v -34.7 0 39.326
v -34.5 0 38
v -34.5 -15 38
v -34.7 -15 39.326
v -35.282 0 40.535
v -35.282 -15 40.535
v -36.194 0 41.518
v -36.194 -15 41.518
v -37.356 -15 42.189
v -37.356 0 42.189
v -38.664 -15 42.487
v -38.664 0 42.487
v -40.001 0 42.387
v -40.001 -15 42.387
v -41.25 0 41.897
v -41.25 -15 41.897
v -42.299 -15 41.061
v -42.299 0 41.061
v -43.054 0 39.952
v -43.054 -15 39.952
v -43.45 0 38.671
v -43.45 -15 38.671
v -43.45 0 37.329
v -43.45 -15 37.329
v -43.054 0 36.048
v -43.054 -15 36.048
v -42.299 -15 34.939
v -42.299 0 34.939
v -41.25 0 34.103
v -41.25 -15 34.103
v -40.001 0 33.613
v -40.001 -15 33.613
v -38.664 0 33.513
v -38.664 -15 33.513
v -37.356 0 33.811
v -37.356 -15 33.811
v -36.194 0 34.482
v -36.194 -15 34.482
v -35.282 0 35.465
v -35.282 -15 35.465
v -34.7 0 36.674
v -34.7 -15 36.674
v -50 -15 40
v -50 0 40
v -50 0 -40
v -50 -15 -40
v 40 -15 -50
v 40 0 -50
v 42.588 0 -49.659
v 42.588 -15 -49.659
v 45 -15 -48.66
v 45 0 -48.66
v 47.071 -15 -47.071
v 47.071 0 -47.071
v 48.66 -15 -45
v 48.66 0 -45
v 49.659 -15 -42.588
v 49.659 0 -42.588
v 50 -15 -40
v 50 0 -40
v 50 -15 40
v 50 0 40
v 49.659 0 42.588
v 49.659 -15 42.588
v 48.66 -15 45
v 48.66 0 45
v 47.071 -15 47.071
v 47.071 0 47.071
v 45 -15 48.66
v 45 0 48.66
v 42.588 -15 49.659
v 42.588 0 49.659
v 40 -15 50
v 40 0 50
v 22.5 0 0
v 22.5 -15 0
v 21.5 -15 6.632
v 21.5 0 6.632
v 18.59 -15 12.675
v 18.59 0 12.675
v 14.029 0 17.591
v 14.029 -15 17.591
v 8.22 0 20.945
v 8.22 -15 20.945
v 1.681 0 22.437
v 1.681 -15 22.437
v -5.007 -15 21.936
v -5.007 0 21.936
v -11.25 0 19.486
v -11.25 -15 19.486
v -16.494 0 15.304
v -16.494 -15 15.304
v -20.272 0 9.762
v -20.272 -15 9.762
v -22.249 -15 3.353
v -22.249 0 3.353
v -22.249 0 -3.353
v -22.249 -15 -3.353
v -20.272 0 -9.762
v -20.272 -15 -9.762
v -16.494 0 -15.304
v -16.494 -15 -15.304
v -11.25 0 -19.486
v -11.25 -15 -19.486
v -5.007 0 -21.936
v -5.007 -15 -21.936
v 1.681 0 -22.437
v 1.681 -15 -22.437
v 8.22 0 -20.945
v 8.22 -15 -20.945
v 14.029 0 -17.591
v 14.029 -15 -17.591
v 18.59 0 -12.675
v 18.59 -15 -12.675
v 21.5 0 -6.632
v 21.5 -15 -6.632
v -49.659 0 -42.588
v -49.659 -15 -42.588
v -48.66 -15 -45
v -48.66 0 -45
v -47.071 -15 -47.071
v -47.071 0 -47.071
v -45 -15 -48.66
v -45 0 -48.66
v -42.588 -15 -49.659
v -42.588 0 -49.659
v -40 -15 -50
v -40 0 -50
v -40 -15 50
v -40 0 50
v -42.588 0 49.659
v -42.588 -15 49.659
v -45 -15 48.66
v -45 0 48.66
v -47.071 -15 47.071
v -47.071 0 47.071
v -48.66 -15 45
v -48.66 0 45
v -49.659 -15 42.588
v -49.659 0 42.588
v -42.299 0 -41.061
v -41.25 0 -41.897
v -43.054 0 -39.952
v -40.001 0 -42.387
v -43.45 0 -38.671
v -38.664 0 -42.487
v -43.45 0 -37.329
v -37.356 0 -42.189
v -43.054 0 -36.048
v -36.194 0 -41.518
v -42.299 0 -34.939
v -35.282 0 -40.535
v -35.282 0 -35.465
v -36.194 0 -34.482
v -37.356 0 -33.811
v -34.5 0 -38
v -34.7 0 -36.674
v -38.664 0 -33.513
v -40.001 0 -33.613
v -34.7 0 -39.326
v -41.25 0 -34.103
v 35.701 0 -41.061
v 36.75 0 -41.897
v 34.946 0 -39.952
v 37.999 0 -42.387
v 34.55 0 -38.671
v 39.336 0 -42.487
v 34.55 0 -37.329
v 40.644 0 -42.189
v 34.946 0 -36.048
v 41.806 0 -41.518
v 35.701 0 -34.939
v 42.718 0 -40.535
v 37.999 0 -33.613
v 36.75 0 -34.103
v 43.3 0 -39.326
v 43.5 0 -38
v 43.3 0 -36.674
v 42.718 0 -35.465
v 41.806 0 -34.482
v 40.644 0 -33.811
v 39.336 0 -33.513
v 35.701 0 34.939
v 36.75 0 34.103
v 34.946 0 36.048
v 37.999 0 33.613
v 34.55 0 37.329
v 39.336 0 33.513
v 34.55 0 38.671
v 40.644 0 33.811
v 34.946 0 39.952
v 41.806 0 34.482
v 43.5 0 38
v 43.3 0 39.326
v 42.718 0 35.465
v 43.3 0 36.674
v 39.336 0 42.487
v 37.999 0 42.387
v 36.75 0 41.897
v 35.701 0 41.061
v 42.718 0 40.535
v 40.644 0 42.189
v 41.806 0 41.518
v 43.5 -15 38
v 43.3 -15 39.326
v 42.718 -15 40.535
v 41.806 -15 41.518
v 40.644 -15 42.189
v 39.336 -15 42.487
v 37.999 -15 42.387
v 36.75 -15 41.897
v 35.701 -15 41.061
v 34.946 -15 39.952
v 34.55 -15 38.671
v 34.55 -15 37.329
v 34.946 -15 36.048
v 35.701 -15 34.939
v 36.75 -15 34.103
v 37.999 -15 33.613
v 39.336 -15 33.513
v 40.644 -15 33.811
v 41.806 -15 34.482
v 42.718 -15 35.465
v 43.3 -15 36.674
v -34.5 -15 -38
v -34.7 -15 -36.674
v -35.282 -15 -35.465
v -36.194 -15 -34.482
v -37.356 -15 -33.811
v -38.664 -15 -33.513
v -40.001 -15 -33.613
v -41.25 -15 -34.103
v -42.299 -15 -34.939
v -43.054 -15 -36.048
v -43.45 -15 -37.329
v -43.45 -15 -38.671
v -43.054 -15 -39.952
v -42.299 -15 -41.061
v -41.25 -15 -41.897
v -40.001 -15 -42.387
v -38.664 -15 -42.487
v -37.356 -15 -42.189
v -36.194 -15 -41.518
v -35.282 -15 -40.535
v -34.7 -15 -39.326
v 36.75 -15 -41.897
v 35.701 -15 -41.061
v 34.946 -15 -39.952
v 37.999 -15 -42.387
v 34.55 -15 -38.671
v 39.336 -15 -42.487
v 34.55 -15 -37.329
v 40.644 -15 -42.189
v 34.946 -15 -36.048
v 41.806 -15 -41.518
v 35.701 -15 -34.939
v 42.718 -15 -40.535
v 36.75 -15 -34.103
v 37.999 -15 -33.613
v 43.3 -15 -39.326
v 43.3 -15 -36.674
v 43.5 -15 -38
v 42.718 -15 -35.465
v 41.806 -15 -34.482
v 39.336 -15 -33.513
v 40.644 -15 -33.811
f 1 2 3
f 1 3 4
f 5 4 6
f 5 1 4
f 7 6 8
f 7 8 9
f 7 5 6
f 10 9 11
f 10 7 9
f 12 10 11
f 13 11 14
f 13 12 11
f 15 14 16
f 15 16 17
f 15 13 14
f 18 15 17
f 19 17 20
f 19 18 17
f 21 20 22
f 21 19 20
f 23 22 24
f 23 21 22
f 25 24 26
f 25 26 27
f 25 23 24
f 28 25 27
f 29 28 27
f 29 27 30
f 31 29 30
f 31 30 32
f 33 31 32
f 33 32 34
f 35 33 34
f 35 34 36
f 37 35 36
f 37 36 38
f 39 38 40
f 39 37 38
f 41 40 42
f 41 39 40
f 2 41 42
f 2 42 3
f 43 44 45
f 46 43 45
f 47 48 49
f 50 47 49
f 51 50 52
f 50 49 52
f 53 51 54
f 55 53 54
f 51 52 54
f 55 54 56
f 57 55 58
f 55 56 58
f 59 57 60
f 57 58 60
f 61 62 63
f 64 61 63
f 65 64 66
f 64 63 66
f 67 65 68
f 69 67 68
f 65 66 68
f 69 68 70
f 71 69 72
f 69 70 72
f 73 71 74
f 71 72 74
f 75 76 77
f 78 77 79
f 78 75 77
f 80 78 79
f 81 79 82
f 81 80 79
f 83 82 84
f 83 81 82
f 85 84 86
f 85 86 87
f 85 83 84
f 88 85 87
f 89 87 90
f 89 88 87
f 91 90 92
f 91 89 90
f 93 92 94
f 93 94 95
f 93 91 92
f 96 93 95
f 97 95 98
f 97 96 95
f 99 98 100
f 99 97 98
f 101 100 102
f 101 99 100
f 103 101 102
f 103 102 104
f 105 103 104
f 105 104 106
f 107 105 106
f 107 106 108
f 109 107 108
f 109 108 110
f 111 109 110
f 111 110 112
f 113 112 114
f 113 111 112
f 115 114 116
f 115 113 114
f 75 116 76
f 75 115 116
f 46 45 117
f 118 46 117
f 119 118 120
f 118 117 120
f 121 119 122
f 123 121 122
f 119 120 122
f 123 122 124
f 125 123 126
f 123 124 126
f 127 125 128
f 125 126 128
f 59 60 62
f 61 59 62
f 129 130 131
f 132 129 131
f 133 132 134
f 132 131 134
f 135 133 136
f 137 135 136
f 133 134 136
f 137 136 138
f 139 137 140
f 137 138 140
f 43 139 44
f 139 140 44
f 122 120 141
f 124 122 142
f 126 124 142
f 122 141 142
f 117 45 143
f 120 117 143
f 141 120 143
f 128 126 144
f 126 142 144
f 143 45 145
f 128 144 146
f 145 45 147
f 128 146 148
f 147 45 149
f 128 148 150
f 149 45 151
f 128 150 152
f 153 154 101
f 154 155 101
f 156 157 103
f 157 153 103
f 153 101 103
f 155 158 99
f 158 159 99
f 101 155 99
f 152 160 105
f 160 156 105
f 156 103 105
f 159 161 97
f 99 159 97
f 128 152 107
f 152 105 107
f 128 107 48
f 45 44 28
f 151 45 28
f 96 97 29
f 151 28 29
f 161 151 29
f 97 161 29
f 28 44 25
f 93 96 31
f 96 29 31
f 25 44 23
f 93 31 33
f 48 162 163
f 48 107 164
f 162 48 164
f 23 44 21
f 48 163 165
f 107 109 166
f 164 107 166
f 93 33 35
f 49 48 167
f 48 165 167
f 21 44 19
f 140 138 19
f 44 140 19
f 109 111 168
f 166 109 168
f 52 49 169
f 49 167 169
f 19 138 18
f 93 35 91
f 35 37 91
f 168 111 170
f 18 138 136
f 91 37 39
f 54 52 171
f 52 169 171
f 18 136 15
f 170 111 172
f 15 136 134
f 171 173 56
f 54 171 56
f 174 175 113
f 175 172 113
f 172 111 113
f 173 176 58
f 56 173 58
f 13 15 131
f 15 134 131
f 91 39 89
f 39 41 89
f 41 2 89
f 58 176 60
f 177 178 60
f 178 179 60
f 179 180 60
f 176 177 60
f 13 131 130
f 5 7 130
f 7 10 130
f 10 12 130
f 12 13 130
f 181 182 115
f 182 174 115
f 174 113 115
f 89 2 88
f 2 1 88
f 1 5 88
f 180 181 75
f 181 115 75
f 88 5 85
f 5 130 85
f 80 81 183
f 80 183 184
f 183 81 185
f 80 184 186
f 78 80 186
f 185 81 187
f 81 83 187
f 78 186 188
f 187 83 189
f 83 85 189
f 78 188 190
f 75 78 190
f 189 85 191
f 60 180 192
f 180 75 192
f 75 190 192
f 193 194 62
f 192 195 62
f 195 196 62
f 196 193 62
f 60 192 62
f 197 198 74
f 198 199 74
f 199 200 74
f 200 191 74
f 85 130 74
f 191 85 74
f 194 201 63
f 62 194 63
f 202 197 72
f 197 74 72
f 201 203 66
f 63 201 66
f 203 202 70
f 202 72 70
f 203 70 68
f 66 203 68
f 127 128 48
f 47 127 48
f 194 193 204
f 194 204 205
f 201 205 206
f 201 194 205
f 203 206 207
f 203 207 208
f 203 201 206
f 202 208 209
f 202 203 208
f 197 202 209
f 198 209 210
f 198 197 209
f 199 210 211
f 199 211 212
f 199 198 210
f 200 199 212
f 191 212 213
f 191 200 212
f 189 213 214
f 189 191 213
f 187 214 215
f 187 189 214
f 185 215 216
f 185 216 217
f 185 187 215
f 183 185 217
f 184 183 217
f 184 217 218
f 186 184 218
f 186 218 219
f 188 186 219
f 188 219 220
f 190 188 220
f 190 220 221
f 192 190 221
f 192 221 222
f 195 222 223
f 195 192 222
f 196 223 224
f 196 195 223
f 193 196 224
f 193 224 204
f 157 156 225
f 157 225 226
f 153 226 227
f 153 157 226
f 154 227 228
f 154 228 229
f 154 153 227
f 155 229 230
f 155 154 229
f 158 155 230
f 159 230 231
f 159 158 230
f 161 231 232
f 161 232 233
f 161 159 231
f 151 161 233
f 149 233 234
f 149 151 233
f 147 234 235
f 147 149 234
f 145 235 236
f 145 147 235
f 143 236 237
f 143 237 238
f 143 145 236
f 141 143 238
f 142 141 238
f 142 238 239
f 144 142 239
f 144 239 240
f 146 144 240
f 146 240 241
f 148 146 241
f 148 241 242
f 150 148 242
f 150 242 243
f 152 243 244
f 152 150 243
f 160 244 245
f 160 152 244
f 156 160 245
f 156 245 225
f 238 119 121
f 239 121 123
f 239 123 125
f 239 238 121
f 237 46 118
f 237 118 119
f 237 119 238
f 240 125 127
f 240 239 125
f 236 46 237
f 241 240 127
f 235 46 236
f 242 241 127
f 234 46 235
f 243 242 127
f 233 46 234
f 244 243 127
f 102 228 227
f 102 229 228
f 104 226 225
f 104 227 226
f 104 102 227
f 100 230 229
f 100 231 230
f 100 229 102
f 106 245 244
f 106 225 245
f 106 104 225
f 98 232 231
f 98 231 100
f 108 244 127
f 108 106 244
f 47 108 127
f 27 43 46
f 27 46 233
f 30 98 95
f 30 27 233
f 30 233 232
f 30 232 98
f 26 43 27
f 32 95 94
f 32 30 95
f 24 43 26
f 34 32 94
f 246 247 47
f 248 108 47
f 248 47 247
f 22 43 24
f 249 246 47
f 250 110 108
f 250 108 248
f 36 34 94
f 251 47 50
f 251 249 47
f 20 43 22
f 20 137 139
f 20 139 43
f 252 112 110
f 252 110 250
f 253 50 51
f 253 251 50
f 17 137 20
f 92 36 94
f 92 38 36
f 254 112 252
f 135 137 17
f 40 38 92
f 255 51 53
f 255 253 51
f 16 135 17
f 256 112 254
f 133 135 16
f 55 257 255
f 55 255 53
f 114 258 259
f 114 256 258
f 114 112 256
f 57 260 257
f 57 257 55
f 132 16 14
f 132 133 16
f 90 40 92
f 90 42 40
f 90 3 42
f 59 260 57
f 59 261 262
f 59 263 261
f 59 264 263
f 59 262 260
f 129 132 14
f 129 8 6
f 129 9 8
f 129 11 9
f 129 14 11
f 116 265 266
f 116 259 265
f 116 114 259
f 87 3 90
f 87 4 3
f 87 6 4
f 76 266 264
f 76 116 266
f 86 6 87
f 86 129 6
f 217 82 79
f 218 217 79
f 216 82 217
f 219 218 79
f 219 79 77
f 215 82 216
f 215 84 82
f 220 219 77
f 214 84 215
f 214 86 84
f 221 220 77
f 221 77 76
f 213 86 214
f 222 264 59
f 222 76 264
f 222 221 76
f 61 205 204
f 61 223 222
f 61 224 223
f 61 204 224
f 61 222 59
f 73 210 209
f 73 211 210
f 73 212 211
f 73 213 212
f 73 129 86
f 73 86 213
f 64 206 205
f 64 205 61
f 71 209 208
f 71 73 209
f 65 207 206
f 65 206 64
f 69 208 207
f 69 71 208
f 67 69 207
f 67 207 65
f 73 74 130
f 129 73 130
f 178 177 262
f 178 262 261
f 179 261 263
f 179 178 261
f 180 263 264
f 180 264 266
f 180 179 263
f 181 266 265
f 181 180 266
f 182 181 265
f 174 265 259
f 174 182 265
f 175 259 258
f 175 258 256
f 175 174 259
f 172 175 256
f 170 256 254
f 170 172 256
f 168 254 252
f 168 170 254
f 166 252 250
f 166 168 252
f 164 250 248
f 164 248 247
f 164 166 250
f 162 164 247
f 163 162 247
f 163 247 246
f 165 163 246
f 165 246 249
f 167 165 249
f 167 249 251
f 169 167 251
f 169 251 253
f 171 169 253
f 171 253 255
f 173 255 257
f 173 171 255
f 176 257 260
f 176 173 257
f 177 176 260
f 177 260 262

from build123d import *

# Parameters (mm, degrees)
F0_R     = 4.5
F0_R_2   = 22.5
F1_DEPTH = 15


with BuildPart() as f1:
    # F0 (on Front) → F1 (new body)
    with BuildSketch(Plane.XZ):
        with BuildLine():
            Line((40, 50), (-40, 50))
            ThreePointArc((-40, 50), (-47.071068, 47.071068), (-50, 40))
            Line((-50, 40), (-50, -40))
            ThreePointArc((-50, -40), (-47.071068, -47.071068), (-40, -50))
            Line((-40, -50), (40, -50))
            ThreePointArc((40, -50), (47.071068, -47.071068), (50, -40))
            Line((50, -40), (50, 40))
            ThreePointArc((50, 40), (47.071068, 47.071068), (40, 50))
        make_face()
        with Locations((-39, -38)):
            Circle(F0_R, mode=Mode.SUBTRACT)
        with Locations((39, -38)):
            Circle(F0_R, mode=Mode.SUBTRACT)
        with Locations((-39, 38)):
            Circle(F0_R, mode=Mode.SUBTRACT)
        Circle(F0_R_2, mode=Mode.SUBTRACT)
        with Locations((39, 38)):
            Circle(F0_R, mode=Mode.SUBTRACT)
    extrude(amount=F1_DEPTH)


solid = f1.part
